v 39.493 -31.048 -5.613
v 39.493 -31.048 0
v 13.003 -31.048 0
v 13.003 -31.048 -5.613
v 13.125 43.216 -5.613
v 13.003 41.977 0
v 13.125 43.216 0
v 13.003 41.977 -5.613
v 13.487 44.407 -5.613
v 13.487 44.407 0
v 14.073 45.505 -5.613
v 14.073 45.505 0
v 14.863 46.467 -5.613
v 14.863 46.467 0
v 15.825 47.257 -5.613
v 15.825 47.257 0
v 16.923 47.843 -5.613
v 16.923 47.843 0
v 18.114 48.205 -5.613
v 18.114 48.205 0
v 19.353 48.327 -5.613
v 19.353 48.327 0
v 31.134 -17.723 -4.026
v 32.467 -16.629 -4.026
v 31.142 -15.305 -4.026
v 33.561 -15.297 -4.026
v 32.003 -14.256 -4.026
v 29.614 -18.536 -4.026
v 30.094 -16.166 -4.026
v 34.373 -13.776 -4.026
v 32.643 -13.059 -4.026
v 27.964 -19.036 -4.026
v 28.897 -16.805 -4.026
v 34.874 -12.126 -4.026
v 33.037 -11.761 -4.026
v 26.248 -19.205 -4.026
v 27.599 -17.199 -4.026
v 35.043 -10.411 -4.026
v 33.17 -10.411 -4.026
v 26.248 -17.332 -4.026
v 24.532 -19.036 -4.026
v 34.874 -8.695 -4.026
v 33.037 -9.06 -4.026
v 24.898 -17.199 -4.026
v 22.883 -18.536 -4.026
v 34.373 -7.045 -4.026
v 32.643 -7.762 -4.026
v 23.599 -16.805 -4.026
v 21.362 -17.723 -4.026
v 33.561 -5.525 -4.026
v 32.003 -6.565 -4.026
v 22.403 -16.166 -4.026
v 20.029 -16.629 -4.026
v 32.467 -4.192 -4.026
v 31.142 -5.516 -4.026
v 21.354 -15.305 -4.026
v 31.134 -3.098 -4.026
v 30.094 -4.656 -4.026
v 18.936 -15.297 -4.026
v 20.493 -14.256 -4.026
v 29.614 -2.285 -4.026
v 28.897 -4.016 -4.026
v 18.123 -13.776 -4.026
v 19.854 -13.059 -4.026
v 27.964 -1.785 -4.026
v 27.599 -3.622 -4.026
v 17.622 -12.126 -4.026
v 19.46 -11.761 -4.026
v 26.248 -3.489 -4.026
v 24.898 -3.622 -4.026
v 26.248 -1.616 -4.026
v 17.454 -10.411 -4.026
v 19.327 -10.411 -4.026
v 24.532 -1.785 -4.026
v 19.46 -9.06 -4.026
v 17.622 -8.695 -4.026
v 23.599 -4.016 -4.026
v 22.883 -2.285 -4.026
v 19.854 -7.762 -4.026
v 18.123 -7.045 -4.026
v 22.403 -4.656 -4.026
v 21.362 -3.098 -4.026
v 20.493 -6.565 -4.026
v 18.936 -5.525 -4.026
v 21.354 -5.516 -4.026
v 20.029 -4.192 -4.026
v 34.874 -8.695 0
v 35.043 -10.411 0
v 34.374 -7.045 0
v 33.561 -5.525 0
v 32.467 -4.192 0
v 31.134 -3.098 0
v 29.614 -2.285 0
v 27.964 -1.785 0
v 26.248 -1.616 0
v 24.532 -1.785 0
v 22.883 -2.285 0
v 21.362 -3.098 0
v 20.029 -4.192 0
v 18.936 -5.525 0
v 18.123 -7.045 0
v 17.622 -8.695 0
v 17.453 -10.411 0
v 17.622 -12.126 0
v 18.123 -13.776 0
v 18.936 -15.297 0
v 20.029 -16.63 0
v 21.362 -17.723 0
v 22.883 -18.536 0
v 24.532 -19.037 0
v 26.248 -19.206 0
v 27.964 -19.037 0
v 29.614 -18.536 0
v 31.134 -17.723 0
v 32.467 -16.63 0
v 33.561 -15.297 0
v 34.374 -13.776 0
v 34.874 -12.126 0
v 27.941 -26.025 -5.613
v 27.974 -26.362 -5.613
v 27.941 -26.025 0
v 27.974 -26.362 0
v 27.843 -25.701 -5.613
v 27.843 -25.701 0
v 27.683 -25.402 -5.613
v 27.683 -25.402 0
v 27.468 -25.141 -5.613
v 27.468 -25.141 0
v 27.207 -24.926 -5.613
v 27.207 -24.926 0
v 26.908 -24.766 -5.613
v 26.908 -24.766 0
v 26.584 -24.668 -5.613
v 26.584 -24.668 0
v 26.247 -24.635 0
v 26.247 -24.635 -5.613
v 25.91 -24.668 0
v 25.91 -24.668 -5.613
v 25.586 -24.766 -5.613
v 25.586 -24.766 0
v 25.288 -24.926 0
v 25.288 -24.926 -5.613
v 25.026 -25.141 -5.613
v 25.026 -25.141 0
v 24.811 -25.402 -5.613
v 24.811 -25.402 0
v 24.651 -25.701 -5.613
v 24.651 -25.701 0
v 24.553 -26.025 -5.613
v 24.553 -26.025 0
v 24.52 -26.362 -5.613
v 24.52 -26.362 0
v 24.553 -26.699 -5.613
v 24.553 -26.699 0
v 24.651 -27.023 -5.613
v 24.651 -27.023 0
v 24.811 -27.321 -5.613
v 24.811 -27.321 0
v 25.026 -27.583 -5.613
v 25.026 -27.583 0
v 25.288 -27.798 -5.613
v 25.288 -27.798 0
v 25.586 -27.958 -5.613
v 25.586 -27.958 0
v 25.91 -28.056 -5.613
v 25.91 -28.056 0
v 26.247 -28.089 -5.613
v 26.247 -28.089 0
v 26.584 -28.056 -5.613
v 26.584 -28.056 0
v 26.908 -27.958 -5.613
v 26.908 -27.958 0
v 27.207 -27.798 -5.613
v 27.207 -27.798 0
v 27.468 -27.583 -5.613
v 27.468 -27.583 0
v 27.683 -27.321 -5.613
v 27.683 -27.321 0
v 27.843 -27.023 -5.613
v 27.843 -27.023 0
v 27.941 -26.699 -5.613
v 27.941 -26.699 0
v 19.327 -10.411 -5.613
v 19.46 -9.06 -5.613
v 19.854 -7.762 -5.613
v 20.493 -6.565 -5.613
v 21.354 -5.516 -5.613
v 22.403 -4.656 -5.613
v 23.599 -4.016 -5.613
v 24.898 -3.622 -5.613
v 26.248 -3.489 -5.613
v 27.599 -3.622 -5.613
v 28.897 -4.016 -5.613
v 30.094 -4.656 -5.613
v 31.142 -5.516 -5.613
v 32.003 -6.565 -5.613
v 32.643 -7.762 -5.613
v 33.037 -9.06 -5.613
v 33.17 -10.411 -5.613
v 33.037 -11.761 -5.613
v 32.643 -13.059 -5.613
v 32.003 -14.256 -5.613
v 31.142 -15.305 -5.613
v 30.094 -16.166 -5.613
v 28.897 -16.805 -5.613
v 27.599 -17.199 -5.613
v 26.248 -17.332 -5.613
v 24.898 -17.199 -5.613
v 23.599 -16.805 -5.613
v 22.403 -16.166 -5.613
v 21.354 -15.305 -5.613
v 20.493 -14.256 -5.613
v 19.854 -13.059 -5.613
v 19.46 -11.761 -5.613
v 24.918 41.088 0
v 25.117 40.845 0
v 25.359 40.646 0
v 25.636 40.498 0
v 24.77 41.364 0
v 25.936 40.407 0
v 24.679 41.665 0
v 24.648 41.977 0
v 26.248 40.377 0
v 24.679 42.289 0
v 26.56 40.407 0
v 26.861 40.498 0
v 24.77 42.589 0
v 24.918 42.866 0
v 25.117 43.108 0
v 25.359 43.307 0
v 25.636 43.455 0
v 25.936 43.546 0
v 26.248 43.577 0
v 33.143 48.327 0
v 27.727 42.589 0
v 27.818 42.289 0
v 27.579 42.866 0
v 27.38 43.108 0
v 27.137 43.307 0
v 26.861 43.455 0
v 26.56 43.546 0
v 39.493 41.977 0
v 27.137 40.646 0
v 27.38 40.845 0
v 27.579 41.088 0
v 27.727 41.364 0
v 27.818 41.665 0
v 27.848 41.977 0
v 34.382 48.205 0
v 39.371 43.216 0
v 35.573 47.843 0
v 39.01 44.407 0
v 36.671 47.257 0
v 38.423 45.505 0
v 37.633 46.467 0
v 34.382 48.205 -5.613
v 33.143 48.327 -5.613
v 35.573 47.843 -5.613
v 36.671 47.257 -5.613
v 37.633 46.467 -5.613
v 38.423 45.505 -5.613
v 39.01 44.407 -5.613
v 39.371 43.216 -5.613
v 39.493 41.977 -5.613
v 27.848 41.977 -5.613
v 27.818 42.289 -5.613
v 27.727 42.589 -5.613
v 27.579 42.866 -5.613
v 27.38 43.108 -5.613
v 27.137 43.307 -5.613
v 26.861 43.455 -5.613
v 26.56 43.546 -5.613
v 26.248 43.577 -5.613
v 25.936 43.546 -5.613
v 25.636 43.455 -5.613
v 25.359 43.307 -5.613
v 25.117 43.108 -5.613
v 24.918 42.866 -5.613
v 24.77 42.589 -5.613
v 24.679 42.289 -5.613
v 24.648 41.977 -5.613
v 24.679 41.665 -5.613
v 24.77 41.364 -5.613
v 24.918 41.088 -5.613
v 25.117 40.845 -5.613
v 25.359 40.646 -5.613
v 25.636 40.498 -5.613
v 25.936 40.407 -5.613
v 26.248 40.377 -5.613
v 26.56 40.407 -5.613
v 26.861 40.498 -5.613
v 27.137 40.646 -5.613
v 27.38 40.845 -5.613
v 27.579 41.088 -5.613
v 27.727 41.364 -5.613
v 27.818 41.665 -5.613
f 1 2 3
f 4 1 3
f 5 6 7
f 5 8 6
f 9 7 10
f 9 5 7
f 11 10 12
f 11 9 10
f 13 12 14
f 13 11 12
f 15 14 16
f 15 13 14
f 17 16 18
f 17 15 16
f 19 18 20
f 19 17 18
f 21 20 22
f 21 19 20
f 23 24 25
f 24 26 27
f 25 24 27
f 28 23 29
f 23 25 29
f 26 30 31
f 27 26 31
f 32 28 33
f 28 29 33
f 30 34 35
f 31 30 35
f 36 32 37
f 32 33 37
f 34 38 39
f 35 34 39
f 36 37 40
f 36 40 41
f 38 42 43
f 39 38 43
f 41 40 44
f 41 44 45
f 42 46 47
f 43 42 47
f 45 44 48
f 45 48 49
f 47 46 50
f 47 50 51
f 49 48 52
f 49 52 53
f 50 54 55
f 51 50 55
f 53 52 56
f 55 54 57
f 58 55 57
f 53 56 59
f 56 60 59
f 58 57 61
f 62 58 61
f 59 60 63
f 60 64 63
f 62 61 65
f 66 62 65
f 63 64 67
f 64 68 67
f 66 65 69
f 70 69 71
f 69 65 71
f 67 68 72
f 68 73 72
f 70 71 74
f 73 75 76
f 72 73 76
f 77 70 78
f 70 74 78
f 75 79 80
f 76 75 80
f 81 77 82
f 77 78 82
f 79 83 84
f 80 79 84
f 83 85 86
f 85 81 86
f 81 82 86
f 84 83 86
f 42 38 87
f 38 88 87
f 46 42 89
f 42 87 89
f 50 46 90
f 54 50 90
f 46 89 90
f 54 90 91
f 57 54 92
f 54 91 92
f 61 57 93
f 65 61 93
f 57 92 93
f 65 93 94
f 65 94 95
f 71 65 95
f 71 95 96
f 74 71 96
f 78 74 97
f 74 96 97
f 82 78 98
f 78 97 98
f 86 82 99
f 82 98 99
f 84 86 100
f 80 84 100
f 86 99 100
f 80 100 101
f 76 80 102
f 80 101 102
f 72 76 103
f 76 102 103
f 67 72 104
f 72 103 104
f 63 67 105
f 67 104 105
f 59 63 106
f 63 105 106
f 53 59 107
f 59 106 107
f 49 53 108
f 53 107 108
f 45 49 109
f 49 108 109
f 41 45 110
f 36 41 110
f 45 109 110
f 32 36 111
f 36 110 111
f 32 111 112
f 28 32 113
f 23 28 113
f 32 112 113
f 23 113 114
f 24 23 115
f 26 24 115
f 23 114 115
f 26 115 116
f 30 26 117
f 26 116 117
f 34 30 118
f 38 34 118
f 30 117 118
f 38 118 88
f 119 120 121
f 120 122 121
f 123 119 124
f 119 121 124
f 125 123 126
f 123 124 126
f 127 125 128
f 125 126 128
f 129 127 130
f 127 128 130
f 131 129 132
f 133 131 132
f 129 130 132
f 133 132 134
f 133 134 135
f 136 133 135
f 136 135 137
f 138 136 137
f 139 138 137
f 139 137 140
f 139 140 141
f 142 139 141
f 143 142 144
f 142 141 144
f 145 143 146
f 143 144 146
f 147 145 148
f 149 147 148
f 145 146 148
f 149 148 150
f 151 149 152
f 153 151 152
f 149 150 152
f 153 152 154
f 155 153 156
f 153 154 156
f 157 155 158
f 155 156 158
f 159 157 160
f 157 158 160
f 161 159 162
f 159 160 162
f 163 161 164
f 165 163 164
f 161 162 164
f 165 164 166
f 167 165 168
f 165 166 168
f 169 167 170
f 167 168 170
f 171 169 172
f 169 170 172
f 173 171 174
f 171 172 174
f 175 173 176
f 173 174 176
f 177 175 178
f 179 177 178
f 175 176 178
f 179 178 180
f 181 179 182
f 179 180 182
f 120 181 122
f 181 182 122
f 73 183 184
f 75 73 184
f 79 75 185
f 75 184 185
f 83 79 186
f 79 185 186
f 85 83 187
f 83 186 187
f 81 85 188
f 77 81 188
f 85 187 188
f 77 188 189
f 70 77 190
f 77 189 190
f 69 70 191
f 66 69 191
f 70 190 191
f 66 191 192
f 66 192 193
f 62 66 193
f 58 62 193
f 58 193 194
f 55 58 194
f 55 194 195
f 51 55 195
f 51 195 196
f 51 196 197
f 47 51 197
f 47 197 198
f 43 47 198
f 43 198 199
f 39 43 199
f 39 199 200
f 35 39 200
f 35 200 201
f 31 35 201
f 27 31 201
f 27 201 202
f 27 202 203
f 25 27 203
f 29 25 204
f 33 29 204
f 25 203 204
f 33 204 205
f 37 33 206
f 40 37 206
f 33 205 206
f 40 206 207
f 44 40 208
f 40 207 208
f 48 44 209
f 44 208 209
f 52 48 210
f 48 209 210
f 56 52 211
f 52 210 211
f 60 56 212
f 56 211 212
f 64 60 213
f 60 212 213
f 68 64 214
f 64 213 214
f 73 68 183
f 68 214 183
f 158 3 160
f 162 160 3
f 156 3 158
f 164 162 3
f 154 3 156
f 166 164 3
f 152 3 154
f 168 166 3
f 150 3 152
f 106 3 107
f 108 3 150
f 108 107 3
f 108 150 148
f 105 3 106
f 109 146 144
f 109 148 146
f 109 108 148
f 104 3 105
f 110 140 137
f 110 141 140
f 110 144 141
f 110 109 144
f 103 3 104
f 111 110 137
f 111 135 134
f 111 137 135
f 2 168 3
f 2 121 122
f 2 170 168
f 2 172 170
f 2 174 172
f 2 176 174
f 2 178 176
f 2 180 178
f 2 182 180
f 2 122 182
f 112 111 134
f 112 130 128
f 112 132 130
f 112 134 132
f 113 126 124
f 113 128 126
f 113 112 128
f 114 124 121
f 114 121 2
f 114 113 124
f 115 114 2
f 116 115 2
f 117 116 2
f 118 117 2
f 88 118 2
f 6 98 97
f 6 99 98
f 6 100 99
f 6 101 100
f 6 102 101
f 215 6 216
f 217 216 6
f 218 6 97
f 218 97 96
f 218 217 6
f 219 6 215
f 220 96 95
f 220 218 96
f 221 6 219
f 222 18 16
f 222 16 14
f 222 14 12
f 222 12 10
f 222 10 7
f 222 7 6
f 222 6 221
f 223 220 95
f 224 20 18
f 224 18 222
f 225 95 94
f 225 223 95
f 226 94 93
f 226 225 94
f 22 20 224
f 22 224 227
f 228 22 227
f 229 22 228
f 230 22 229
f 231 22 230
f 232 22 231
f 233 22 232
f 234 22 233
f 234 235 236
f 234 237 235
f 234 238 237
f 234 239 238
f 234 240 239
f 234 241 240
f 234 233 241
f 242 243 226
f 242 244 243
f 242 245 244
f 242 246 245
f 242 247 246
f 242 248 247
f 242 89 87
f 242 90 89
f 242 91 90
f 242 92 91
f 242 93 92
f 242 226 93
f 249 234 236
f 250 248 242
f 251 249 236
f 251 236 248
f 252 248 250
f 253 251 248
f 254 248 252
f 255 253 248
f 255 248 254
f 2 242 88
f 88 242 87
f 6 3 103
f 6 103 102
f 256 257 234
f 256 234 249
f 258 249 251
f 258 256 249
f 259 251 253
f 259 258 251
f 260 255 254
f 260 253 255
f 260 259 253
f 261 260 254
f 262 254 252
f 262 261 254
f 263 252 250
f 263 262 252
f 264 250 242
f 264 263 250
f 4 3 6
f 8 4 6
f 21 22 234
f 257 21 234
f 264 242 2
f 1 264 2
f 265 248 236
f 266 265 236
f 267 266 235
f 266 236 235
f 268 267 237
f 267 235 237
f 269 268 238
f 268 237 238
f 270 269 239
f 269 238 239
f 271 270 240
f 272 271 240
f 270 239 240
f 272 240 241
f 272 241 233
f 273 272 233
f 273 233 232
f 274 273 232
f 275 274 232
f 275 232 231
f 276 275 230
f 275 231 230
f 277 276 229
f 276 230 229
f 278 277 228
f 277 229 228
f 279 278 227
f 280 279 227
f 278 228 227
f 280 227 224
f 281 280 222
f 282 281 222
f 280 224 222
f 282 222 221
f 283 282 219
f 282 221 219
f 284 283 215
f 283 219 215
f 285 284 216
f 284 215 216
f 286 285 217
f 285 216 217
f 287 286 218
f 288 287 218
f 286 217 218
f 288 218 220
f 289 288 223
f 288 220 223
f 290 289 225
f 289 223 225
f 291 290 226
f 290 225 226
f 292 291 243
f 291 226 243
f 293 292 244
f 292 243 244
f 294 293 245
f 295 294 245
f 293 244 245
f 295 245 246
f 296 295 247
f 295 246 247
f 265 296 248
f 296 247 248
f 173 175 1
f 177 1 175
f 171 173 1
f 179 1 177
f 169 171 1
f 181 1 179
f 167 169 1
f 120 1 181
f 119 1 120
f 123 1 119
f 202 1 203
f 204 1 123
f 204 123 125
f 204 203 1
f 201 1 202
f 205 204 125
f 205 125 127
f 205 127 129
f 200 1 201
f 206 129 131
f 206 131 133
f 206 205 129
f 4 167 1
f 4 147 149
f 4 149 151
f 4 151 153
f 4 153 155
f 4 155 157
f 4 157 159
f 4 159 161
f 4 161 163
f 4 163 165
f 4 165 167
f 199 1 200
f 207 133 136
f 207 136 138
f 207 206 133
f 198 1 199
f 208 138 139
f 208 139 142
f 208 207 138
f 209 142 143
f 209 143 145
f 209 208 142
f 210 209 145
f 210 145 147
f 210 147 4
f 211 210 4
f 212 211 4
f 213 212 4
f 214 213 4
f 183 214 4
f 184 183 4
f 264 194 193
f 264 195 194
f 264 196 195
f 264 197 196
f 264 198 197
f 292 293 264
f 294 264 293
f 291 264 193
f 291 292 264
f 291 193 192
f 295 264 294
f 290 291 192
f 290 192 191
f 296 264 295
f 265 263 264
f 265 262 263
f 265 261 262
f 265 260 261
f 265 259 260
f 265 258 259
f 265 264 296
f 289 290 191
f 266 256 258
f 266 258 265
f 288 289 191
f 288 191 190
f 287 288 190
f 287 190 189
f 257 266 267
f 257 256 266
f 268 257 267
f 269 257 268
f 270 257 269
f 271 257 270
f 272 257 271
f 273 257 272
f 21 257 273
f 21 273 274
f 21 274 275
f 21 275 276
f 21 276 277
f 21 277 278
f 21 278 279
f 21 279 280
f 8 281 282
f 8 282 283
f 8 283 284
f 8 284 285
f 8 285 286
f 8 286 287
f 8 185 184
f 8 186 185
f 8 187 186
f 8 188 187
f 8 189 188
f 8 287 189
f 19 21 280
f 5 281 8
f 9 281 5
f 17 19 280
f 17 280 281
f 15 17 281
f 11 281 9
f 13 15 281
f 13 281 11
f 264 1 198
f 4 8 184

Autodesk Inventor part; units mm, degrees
ref_plane "YZ Plane" through (0, 0, 0) normal (1, 0, 0) x (0, 1, 0)
ref_plane "XZ Plane" through (0, 0, 0) normal (0, 1, 0) x (-1, 0, 0)
ref_plane "XY Plane" through (0, 0, 0) normal (0, 0, 1) x (1, 0, 0)
sketch "Sketch1" plane through (0, 0, 0) normal (0, 0, 1) x (1, 0, 0)
  line L0 (18.6455, 5.0782) -> (18.6456, 5.0782)
  circle A0 centre (26.2482, -10.4107) radius 8.7948
  line L1 (39.4932, 48.3268) -> (39.4932, -31.0482)
  line L2 (13.0032, -31.0482) -> (13.0032, 48.3268)
  line L3 (13.0032, 48.3268) -> (39.4932, 48.3268)
  line L4 (39.4932, -31.0482) -> (13.0032, -31.0482)
  circle A1 centre (26.2471, -24.96) radius 1.5875
  point P0 (0, 0)
  dimension "d0" = 17.5895
  dimension "d3" = 26.49
  dimension "d4" = 13.245
  dimension "d5" = 58.7375
  dimension "d6" = 79.375
  dimension "d15" = 3.175
  dimension "d25" = 26.49
  dimension "d26" = 13.2461
extrude "Extrusion1" add sketch "Sketch1" against normal blind 5.6134 contours L1 L4 L2 L3 | A1
sketch "Sketch2" plane through (0, 0, 0) normal (0, 0, 1) x (1, 0, 0)
  line L0 (13.0032, 48.3268) -> (39.4932, 48.3268) projected
  circle A0 centre (26.2482, 41.9768) radius 1.6002
  point P0 (0, 0)
  point P1 (0, 0)
  dimension "d10" = 3.2004
  dimension "d12" = 6.35
extrude "Extrusion2" cut sketch "Sketch2" against normal blind 5.6134
sketch "Sketch3" plane through (0, 0, 0) normal (0, 0, 1) x (1, 0, 0)
  circle A0 centre (26.2482, -10.4107) radius 8.7947 projected
  circle A1 centre (26.2471, -26.3619) radius 1.7272
  line L0 (39.4932, 48.3268) -> (39.4932, -31.0482) projected
  point P0 (0, 0)
  dimension "d17" = 3.4544
  dimension "d18" = 15.9512
  dimension "d27" = 13.2461
extrude "Extrusion3" cut sketch "Sketch3" against normal blind 5.6134 contours A1
fillet "Fillet1" radius 6.35 2 edges at (13.0032, 48.3268, -2.8067) (39.4932, 48.3268, -2.8067)
sketch "Sketch5" plane through (0, 0, -5.6134) normal (0, 0, -1) x (-1, 0, 0)
  circle A0 centre (-26.2482, -10.4107) radius 8.7947 projected
  circle A1 centre (-26.2482, -10.4107) radius 6.9215
  point P0 (0, 0)
  dimension "d28" = 13.843
extrude "Extrusion5" add sketch "Sketch5" against normal blind 1.5875
properties part number "Lidar Sensor Case v4 Piece 1"
